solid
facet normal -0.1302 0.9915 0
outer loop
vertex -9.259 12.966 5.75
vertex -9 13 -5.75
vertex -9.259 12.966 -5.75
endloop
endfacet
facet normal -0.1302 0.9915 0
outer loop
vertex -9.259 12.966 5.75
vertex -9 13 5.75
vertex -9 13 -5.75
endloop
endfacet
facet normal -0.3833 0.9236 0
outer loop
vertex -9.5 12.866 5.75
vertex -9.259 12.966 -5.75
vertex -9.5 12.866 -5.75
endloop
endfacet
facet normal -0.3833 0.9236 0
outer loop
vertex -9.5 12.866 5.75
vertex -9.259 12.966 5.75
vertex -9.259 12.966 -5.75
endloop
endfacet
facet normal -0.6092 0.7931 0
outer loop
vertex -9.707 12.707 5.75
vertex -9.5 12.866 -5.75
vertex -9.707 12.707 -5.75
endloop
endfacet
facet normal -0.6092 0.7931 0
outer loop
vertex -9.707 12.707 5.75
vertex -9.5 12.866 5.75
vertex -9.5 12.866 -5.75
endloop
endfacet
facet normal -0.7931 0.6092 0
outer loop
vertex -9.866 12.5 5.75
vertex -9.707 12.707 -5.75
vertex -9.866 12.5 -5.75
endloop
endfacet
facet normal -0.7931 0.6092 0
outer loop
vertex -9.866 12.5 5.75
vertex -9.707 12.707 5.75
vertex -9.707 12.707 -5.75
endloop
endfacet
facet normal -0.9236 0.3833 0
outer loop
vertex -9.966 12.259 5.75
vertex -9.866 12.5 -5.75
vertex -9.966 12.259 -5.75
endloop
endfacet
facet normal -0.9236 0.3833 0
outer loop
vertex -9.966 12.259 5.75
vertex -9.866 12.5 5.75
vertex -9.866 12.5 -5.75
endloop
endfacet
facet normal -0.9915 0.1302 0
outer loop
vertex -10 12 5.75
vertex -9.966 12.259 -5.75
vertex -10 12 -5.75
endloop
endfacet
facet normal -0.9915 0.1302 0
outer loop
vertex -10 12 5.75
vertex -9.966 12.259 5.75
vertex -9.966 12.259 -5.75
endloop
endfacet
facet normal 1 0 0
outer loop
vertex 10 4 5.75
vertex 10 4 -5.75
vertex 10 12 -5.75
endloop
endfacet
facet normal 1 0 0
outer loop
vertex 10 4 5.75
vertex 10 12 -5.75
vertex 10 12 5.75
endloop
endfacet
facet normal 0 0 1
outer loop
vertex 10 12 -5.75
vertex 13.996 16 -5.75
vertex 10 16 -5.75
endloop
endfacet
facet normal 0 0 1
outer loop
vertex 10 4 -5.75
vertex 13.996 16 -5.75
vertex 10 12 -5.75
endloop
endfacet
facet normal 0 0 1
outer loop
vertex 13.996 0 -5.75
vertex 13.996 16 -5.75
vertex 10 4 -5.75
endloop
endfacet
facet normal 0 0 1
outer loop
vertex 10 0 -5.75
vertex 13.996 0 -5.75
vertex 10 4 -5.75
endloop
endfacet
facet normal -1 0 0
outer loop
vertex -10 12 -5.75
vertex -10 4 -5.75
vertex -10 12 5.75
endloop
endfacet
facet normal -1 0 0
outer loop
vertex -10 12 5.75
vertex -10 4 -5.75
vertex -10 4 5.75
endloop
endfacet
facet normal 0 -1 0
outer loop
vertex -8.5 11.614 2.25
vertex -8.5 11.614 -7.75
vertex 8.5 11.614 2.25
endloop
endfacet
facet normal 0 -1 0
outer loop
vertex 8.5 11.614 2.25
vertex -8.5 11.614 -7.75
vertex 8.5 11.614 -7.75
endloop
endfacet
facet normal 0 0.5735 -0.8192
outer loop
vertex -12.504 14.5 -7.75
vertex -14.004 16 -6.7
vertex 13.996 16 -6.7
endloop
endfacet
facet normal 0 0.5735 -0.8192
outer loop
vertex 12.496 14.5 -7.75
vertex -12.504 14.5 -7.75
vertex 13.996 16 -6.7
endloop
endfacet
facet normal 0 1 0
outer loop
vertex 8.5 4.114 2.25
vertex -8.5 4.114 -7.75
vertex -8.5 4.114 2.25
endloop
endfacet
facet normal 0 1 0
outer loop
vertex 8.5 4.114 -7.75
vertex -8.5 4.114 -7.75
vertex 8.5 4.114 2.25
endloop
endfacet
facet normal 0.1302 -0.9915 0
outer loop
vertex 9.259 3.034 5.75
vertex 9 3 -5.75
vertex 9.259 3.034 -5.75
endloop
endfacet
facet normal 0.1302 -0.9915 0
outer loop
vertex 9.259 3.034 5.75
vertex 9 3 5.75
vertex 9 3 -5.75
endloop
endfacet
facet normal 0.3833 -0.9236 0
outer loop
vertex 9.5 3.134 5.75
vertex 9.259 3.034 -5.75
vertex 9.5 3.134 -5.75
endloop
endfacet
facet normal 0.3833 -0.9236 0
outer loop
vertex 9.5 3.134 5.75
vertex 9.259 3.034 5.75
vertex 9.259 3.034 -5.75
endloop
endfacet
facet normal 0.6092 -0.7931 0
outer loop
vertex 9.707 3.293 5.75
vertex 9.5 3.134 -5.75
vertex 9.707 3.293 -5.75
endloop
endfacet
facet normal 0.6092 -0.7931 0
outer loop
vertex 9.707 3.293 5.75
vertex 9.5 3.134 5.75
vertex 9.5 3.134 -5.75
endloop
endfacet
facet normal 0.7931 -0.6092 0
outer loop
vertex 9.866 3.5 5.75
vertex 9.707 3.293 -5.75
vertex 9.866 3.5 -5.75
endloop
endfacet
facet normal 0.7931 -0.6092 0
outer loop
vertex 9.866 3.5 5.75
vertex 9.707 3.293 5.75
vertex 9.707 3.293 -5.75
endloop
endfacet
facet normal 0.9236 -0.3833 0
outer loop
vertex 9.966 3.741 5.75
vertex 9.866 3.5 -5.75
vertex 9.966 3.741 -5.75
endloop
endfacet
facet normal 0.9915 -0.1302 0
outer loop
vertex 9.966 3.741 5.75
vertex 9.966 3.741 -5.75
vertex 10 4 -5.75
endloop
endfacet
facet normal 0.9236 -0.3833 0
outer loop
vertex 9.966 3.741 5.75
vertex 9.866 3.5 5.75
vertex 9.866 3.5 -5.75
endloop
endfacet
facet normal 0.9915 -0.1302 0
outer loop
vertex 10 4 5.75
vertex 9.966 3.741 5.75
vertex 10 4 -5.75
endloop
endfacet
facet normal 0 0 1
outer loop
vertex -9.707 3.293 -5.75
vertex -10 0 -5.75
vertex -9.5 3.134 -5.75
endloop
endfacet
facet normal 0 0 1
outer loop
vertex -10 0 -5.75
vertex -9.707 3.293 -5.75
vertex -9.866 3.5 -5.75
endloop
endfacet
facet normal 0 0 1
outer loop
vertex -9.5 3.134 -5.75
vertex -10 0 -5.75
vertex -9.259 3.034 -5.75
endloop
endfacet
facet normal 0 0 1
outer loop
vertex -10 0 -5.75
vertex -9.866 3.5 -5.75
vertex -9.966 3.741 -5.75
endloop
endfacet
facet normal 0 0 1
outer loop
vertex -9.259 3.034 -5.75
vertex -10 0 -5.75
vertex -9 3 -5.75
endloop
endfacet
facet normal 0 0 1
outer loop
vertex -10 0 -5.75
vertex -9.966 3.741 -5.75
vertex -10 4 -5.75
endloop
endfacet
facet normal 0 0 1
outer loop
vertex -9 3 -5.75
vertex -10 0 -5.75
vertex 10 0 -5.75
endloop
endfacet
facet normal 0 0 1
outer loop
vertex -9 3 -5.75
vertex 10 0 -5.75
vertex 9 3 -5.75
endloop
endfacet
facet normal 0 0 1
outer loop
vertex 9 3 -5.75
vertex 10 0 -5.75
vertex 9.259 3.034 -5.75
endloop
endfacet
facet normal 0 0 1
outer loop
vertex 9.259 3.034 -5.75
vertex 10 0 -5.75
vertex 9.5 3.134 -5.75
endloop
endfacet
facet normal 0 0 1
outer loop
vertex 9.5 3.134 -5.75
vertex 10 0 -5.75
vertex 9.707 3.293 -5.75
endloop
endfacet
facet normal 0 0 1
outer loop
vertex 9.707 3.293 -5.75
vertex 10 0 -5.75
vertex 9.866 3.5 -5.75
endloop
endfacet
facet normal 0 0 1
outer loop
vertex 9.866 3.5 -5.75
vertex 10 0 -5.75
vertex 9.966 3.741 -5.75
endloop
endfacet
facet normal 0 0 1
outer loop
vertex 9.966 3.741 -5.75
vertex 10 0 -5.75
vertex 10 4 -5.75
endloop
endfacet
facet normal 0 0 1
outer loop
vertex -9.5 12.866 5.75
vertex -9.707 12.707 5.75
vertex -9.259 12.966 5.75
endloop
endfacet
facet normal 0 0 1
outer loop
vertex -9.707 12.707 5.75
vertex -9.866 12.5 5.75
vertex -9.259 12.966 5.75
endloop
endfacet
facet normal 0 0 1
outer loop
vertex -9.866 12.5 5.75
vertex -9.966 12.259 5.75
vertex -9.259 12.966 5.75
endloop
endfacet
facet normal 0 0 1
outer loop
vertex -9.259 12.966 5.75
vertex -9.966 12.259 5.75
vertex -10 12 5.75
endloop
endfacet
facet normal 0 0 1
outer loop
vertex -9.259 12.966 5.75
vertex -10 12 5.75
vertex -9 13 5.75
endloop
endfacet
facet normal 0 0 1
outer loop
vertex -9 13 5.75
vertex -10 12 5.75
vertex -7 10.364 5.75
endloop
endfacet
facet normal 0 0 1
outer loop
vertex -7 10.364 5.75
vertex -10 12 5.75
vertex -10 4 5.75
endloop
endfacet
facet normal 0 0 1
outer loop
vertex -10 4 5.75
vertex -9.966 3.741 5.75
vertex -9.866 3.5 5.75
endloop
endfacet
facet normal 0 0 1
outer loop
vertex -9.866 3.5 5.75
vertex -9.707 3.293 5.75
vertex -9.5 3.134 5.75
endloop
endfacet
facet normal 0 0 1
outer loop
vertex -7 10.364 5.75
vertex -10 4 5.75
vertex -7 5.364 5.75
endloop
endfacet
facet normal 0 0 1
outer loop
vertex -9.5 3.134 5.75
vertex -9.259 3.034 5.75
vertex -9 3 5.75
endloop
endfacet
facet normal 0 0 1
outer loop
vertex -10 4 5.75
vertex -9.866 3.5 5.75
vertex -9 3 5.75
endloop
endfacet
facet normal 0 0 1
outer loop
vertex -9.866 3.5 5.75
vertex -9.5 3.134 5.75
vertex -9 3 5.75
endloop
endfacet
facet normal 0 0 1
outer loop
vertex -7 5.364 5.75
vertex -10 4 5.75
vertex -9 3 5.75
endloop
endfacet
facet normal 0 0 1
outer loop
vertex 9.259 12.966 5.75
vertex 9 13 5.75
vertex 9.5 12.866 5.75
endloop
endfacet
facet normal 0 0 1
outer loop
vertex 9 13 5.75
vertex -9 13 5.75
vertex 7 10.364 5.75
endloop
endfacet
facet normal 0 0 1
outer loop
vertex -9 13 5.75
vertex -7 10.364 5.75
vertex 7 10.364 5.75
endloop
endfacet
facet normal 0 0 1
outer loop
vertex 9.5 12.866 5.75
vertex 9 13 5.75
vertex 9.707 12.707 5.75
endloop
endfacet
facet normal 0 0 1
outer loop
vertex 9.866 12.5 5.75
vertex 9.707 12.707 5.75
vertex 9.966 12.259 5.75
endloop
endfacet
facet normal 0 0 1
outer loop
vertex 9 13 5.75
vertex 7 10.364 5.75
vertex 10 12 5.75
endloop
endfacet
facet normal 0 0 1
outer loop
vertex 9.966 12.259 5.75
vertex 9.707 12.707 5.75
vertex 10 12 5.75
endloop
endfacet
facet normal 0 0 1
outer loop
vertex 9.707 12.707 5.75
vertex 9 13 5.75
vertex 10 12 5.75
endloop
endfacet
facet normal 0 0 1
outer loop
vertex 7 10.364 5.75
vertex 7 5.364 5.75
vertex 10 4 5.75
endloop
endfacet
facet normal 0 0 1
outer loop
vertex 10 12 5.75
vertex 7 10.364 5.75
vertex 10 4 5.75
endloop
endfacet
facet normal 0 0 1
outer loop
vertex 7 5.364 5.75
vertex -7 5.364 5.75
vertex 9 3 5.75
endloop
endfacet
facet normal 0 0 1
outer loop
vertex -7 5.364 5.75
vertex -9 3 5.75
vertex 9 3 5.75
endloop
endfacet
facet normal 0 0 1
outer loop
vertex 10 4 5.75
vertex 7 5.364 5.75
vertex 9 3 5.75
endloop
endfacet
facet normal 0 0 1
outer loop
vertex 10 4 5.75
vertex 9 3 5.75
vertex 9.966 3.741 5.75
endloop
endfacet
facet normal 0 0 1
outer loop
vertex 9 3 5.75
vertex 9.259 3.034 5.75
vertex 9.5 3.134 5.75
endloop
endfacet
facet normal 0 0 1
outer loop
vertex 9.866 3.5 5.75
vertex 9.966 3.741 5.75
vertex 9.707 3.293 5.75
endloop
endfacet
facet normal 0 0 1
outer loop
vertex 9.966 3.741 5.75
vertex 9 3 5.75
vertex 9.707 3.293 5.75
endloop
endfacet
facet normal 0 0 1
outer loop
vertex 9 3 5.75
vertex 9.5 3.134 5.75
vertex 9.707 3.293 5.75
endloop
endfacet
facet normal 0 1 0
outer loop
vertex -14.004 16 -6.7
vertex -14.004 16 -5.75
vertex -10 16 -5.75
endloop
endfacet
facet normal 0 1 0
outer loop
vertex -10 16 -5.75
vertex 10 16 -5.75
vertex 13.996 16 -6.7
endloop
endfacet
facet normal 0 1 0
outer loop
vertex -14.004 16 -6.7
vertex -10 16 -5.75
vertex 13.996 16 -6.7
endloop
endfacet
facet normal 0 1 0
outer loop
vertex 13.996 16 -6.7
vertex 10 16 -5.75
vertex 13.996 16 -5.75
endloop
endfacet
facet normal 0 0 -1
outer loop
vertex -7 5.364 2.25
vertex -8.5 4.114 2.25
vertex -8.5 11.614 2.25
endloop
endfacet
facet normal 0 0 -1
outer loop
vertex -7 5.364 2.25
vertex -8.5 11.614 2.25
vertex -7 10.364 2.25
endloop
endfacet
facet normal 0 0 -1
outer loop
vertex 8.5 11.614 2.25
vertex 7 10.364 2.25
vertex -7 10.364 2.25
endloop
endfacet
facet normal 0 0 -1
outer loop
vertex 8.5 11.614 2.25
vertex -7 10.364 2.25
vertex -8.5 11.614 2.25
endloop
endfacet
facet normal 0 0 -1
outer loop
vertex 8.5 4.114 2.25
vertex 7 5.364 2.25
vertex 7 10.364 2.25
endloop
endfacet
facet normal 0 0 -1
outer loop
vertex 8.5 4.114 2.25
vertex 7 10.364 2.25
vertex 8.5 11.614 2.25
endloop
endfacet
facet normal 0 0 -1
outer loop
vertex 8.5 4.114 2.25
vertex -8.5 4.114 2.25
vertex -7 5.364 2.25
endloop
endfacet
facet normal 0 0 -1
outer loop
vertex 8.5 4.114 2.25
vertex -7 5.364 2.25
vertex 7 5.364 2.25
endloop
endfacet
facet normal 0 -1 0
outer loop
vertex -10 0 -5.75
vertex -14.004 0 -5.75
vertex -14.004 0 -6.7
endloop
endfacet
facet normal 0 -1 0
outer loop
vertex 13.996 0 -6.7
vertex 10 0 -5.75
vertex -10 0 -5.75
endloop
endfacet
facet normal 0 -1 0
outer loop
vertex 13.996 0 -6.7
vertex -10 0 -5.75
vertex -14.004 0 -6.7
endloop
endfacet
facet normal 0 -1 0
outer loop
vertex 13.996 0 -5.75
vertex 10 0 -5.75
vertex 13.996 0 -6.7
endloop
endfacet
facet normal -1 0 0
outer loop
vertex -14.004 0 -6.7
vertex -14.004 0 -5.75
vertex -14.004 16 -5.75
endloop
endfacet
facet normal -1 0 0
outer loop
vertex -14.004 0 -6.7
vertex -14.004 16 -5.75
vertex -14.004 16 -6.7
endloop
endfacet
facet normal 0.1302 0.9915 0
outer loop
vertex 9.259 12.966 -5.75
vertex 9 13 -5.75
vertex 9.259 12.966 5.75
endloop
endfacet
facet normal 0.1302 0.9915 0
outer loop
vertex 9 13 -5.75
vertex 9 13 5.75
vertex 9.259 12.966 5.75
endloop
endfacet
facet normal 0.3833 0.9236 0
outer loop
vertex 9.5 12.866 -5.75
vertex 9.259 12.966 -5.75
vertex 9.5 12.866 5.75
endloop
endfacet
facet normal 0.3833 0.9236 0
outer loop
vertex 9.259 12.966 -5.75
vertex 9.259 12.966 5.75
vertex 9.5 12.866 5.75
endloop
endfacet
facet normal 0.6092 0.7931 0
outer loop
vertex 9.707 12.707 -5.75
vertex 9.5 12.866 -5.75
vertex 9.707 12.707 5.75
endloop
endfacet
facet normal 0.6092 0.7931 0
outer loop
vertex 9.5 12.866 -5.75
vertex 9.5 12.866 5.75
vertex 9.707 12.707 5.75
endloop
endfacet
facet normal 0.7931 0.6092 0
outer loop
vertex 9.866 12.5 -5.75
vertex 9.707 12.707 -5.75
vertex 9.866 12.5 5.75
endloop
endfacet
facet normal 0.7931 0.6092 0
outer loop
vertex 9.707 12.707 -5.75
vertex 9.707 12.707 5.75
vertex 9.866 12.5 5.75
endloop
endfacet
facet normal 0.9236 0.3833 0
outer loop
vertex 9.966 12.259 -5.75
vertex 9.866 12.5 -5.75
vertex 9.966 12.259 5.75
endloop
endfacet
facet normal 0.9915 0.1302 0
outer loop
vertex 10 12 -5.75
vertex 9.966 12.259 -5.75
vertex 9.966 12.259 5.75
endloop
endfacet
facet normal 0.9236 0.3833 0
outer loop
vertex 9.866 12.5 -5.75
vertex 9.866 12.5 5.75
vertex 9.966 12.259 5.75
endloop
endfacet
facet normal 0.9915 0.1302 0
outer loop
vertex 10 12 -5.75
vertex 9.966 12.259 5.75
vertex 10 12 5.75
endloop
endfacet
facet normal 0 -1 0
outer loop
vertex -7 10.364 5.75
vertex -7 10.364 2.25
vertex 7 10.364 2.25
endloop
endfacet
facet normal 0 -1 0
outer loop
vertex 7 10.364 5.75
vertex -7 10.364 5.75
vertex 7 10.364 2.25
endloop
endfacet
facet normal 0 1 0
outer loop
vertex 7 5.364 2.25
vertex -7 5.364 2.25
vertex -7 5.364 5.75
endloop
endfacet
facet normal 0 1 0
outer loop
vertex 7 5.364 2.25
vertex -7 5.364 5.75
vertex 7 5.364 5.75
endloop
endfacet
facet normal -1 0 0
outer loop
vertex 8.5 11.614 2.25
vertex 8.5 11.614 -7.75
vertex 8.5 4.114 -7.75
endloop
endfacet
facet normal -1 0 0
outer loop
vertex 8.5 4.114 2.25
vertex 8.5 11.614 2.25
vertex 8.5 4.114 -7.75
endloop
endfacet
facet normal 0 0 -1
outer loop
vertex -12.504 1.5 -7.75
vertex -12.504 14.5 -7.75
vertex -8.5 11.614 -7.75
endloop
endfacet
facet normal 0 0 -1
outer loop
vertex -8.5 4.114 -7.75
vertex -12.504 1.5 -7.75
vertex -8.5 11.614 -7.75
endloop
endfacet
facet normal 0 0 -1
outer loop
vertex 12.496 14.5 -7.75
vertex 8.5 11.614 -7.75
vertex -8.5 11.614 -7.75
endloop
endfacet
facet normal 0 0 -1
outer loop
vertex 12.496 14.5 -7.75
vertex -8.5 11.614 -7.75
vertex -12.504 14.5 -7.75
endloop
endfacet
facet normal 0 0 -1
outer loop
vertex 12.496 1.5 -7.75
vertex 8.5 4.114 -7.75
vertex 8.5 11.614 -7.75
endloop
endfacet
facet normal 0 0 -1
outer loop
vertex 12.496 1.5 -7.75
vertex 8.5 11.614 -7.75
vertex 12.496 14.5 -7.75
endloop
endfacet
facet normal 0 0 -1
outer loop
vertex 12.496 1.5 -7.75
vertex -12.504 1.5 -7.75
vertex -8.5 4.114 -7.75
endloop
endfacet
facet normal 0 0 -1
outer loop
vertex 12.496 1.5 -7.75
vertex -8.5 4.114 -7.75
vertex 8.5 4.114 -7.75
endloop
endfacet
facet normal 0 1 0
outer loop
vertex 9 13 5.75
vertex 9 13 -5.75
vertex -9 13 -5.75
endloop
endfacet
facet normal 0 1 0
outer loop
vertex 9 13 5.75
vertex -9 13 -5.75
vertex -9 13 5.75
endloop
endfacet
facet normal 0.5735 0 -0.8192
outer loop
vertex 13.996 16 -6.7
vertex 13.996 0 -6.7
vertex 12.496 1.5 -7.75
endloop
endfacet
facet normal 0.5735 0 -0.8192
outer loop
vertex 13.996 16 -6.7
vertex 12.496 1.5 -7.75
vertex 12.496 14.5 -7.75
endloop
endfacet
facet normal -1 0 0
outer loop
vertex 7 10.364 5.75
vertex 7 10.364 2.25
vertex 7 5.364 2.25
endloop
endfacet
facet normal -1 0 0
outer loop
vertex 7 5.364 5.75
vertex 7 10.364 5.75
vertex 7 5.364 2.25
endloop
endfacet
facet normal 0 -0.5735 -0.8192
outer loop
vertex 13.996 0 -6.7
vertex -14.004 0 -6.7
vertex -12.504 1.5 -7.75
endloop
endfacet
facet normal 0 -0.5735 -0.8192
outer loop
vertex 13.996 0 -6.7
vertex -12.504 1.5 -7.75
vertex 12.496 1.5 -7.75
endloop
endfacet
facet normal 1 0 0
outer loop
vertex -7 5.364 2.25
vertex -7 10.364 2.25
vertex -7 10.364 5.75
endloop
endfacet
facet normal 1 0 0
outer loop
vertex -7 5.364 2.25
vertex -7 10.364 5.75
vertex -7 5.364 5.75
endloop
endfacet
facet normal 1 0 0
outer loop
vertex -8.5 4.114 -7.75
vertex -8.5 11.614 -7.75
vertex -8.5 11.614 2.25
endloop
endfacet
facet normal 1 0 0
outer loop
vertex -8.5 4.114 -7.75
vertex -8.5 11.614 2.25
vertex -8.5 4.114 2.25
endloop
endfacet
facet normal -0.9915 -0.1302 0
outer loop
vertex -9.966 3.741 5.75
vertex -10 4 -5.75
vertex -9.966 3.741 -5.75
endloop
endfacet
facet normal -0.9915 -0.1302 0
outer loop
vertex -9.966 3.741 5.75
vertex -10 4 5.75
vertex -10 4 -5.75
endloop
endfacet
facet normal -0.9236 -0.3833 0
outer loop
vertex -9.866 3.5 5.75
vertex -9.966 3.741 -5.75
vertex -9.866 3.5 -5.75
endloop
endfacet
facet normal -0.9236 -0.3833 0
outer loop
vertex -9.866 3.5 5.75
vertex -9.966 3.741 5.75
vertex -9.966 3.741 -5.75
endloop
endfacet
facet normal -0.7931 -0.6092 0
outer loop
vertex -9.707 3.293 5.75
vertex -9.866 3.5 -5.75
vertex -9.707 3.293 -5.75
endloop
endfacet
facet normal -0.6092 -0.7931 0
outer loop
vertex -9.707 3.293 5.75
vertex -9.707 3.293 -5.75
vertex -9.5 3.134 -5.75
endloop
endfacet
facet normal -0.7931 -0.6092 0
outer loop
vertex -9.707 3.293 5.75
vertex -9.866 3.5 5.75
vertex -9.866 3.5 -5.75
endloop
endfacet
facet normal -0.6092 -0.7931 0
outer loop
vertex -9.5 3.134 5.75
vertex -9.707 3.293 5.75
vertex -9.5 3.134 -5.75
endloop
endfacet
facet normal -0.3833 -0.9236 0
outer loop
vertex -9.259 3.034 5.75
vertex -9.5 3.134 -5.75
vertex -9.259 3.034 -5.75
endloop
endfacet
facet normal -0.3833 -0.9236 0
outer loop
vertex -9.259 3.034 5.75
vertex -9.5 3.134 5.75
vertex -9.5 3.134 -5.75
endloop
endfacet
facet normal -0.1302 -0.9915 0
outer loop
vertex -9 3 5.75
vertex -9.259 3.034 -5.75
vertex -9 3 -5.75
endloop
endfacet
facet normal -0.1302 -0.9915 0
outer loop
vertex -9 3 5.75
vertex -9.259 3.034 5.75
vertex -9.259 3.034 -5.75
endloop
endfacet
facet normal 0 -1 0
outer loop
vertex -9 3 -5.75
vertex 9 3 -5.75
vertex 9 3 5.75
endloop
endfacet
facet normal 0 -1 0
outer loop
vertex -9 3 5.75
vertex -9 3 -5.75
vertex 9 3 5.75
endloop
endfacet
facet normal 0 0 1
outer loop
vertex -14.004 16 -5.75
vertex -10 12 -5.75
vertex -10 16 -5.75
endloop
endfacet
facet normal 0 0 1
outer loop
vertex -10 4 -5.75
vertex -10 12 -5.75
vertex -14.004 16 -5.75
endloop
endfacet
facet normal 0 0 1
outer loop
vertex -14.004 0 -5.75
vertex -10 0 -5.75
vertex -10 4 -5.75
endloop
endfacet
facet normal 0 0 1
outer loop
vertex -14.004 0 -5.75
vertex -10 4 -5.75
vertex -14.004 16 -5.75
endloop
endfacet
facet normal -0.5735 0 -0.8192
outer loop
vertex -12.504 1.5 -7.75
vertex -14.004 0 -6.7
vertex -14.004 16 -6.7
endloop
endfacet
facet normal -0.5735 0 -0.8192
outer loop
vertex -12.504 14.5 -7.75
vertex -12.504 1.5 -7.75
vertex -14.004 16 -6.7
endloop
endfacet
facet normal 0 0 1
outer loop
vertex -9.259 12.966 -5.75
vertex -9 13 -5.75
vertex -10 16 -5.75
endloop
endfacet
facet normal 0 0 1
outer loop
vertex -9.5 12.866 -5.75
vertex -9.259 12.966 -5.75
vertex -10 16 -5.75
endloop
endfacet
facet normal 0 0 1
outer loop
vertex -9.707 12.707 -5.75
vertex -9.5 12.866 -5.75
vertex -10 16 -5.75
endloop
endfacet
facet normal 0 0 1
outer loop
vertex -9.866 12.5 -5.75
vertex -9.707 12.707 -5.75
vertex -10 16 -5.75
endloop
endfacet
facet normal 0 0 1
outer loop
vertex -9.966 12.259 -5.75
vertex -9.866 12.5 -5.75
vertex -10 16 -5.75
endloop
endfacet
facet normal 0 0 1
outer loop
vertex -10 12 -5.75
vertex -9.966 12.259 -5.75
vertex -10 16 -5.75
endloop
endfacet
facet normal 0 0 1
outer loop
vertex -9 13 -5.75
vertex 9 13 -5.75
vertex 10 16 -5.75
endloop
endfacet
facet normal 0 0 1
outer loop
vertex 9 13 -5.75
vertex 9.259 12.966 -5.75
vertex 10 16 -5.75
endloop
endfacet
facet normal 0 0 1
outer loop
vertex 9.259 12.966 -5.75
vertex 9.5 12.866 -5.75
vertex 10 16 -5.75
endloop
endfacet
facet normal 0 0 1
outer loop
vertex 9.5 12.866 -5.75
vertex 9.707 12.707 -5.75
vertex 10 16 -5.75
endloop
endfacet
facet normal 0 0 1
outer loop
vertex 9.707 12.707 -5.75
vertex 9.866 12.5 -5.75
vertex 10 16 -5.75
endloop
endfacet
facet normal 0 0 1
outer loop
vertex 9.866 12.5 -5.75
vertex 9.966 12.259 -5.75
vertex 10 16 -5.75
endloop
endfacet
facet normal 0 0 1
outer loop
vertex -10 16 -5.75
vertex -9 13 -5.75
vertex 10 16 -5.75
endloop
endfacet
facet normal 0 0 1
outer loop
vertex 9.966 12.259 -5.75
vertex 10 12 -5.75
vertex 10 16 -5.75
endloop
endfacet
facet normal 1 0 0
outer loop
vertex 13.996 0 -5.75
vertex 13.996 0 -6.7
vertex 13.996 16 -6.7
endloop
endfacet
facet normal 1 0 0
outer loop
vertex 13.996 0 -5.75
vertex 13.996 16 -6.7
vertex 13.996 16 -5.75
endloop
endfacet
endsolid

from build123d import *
from build123d import SkipClean  # not in build123d's __all__

# Parameters (mm, degrees)
F0_W     = 20
F0_H     = 11.5
F1_DEPTH = 16
F2_W     = 3
F2_H     = 11.5
F3_DEPTH = 25
F4_W     = 17
F4_H     = 7.5
F4_W_2   = 14
F4_H_2   = 5
F5_DEPTH = 10
F6_DEPTH = 25
F7_SIZE2 = 1.0503113073
F7_SIZE  = 1.5
F8_R     = 1


# Not quite as in the source:
# - ends of sketch curves that miss each other by under 0.0002 mm in the source are joined


with BuildPart() as f1:
    # F0 (on Front) → F1 (new body)
    with BuildSketch(Plane.XZ):
        Rectangle(F0_W, F0_H)
        Polygon((13.9961953573, -5.7499998733), (10, -5.7499998733), (-10, -5.75), (-14.0038046427, -5.7499998733), (-14.0038046427, -7.7499998733), (13.9961953573, -7.7499998733), align=None)
    extrude(amount=-F1_DEPTH)

    # F2 (on face) → F3 (cut)
    with BuildSketch(Plane.YZ.offset(10)):
        with Locations((1.5, 0)):
            Rectangle(F2_W, F2_H)
        with Locations((14.50000076, 0)):
            Rectangle(F2_W, F2_H)
    with SkipClean():  # cleaning this boolean's faces spoils the solid; the shape is the same uncleaned
        extrude(amount=-F3_DEPTH, mode=Mode.SUBTRACT)

    # F4 (on face) → F5 (cut)
    with BuildSketch(Plane(origin=(0, 0, -7.7499998733), x_dir=(1, 0, 0), z_dir=(0, 0, -1))):
        with Locations((0, -7.8641947285)):
            Rectangle(F4_W, F4_H)
        with Locations((0, -7.8641947285)):
            Rectangle(F4_W_2, F4_H_2, mode=Mode.SUBTRACT)
    with SkipClean():  # cleaning this boolean's faces spoils the solid; the shape is the same uncleaned
        extrude(amount=-F5_DEPTH, mode=Mode.SUBTRACT)

    # F4 (on face) → F6 (cut)
    with BuildSketch(Plane(origin=(0, 0, -7.7499998733), x_dir=(1, 0, 0), z_dir=(0, 0, -1))):
        with Locations((0, -7.8641947285)):
            Rectangle(F4_W_2, F4_H_2)
    with SkipClean():  # cleaning this boolean's faces spoils the solid; the shape is the same uncleaned
        extrude(amount=-F6_DEPTH, mode=Mode.SUBTRACT)

    # F7
    f7_edges = [f1.edges().sort_by_distance(p)[0] for p in [
        (-0.003805, 16, -7.75),
        (13.996195, 8, -7.75),
        (-0.003805, 0, -7.75),
        (-14.003805, 8, -7.75),
    ]]
    f7_side = f1.faces().sort_by_distance((-13.681314, 8, -7.75))[0]
    chamfer(f7_edges, length=F7_SIZE, length2=F7_SIZE2, reference=f7_side)

    # F8
    f8_edges = [f1.edges().sort_by_distance(p)[0] for p in [
        (10, 3, 0),
        (10, 13.000001, 0),
        (-10, 3, 0),
        (-10, 13.000001, 0),
    ]]
    fillet(f8_edges, radius=F8_R)


solid = f1.part
